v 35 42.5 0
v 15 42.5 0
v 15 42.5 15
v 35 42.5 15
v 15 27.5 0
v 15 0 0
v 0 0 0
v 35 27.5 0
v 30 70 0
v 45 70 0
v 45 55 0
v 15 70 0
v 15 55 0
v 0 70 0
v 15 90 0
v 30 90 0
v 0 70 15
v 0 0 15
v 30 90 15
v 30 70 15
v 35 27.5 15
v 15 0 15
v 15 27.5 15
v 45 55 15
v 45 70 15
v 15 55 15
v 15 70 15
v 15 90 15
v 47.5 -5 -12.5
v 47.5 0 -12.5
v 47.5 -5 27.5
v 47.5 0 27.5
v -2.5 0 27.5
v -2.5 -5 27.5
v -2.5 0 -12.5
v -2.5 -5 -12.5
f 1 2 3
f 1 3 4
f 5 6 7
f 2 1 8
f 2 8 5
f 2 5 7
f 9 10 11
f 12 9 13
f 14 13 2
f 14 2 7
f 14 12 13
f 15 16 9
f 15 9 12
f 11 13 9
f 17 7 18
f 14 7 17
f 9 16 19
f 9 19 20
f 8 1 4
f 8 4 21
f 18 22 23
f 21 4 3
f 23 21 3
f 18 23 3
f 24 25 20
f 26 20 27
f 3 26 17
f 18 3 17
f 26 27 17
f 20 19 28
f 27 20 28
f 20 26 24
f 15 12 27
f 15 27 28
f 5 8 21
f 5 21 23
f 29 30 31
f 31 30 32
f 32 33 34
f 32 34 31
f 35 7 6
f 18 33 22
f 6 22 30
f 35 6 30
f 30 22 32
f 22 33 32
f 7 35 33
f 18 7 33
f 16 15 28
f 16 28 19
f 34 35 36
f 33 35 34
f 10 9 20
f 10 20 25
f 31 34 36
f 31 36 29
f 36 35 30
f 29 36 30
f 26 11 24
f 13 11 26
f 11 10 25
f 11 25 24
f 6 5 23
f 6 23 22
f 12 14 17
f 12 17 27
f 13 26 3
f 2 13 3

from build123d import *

# Parameters (mm, degrees)
AUFSATZ_LINEAR_AUSTRAGEN1_DEPTH = 15
SKIZZE2_W                       = 50
SKIZZE2_H                       = 40
AUFSATZ_LINEAR_AUSTRAGEN2_DEPTH = 5


with BuildPart() as part:
    # Skizze1 → Aufsatz-Linear austragen1 (new body)
    with BuildSketch(Plane.XY):
        Polygon((0, 0), (0, 70), (15, 70), (15, 90), (30, 90), (30, 70), (45, 70), (45, 55), (15, 55), (15, 42.5), (35, 42.5), (35, 27.5), (15, 27.5), (15, 0), align=None)
    extrude(amount=AUFSATZ_LINEAR_AUSTRAGEN1_DEPTH)

    # Skizze2 → Aufsatz-Linear austragen2 (add)
    with BuildSketch(Plane.XZ):
        with Locations((22.5, 7.5)):
            Rectangle(SKIZZE2_W, SKIZZE2_H)
    extrude(amount=AUFSATZ_LINEAR_AUSTRAGEN2_DEPTH)


solid = part.part
